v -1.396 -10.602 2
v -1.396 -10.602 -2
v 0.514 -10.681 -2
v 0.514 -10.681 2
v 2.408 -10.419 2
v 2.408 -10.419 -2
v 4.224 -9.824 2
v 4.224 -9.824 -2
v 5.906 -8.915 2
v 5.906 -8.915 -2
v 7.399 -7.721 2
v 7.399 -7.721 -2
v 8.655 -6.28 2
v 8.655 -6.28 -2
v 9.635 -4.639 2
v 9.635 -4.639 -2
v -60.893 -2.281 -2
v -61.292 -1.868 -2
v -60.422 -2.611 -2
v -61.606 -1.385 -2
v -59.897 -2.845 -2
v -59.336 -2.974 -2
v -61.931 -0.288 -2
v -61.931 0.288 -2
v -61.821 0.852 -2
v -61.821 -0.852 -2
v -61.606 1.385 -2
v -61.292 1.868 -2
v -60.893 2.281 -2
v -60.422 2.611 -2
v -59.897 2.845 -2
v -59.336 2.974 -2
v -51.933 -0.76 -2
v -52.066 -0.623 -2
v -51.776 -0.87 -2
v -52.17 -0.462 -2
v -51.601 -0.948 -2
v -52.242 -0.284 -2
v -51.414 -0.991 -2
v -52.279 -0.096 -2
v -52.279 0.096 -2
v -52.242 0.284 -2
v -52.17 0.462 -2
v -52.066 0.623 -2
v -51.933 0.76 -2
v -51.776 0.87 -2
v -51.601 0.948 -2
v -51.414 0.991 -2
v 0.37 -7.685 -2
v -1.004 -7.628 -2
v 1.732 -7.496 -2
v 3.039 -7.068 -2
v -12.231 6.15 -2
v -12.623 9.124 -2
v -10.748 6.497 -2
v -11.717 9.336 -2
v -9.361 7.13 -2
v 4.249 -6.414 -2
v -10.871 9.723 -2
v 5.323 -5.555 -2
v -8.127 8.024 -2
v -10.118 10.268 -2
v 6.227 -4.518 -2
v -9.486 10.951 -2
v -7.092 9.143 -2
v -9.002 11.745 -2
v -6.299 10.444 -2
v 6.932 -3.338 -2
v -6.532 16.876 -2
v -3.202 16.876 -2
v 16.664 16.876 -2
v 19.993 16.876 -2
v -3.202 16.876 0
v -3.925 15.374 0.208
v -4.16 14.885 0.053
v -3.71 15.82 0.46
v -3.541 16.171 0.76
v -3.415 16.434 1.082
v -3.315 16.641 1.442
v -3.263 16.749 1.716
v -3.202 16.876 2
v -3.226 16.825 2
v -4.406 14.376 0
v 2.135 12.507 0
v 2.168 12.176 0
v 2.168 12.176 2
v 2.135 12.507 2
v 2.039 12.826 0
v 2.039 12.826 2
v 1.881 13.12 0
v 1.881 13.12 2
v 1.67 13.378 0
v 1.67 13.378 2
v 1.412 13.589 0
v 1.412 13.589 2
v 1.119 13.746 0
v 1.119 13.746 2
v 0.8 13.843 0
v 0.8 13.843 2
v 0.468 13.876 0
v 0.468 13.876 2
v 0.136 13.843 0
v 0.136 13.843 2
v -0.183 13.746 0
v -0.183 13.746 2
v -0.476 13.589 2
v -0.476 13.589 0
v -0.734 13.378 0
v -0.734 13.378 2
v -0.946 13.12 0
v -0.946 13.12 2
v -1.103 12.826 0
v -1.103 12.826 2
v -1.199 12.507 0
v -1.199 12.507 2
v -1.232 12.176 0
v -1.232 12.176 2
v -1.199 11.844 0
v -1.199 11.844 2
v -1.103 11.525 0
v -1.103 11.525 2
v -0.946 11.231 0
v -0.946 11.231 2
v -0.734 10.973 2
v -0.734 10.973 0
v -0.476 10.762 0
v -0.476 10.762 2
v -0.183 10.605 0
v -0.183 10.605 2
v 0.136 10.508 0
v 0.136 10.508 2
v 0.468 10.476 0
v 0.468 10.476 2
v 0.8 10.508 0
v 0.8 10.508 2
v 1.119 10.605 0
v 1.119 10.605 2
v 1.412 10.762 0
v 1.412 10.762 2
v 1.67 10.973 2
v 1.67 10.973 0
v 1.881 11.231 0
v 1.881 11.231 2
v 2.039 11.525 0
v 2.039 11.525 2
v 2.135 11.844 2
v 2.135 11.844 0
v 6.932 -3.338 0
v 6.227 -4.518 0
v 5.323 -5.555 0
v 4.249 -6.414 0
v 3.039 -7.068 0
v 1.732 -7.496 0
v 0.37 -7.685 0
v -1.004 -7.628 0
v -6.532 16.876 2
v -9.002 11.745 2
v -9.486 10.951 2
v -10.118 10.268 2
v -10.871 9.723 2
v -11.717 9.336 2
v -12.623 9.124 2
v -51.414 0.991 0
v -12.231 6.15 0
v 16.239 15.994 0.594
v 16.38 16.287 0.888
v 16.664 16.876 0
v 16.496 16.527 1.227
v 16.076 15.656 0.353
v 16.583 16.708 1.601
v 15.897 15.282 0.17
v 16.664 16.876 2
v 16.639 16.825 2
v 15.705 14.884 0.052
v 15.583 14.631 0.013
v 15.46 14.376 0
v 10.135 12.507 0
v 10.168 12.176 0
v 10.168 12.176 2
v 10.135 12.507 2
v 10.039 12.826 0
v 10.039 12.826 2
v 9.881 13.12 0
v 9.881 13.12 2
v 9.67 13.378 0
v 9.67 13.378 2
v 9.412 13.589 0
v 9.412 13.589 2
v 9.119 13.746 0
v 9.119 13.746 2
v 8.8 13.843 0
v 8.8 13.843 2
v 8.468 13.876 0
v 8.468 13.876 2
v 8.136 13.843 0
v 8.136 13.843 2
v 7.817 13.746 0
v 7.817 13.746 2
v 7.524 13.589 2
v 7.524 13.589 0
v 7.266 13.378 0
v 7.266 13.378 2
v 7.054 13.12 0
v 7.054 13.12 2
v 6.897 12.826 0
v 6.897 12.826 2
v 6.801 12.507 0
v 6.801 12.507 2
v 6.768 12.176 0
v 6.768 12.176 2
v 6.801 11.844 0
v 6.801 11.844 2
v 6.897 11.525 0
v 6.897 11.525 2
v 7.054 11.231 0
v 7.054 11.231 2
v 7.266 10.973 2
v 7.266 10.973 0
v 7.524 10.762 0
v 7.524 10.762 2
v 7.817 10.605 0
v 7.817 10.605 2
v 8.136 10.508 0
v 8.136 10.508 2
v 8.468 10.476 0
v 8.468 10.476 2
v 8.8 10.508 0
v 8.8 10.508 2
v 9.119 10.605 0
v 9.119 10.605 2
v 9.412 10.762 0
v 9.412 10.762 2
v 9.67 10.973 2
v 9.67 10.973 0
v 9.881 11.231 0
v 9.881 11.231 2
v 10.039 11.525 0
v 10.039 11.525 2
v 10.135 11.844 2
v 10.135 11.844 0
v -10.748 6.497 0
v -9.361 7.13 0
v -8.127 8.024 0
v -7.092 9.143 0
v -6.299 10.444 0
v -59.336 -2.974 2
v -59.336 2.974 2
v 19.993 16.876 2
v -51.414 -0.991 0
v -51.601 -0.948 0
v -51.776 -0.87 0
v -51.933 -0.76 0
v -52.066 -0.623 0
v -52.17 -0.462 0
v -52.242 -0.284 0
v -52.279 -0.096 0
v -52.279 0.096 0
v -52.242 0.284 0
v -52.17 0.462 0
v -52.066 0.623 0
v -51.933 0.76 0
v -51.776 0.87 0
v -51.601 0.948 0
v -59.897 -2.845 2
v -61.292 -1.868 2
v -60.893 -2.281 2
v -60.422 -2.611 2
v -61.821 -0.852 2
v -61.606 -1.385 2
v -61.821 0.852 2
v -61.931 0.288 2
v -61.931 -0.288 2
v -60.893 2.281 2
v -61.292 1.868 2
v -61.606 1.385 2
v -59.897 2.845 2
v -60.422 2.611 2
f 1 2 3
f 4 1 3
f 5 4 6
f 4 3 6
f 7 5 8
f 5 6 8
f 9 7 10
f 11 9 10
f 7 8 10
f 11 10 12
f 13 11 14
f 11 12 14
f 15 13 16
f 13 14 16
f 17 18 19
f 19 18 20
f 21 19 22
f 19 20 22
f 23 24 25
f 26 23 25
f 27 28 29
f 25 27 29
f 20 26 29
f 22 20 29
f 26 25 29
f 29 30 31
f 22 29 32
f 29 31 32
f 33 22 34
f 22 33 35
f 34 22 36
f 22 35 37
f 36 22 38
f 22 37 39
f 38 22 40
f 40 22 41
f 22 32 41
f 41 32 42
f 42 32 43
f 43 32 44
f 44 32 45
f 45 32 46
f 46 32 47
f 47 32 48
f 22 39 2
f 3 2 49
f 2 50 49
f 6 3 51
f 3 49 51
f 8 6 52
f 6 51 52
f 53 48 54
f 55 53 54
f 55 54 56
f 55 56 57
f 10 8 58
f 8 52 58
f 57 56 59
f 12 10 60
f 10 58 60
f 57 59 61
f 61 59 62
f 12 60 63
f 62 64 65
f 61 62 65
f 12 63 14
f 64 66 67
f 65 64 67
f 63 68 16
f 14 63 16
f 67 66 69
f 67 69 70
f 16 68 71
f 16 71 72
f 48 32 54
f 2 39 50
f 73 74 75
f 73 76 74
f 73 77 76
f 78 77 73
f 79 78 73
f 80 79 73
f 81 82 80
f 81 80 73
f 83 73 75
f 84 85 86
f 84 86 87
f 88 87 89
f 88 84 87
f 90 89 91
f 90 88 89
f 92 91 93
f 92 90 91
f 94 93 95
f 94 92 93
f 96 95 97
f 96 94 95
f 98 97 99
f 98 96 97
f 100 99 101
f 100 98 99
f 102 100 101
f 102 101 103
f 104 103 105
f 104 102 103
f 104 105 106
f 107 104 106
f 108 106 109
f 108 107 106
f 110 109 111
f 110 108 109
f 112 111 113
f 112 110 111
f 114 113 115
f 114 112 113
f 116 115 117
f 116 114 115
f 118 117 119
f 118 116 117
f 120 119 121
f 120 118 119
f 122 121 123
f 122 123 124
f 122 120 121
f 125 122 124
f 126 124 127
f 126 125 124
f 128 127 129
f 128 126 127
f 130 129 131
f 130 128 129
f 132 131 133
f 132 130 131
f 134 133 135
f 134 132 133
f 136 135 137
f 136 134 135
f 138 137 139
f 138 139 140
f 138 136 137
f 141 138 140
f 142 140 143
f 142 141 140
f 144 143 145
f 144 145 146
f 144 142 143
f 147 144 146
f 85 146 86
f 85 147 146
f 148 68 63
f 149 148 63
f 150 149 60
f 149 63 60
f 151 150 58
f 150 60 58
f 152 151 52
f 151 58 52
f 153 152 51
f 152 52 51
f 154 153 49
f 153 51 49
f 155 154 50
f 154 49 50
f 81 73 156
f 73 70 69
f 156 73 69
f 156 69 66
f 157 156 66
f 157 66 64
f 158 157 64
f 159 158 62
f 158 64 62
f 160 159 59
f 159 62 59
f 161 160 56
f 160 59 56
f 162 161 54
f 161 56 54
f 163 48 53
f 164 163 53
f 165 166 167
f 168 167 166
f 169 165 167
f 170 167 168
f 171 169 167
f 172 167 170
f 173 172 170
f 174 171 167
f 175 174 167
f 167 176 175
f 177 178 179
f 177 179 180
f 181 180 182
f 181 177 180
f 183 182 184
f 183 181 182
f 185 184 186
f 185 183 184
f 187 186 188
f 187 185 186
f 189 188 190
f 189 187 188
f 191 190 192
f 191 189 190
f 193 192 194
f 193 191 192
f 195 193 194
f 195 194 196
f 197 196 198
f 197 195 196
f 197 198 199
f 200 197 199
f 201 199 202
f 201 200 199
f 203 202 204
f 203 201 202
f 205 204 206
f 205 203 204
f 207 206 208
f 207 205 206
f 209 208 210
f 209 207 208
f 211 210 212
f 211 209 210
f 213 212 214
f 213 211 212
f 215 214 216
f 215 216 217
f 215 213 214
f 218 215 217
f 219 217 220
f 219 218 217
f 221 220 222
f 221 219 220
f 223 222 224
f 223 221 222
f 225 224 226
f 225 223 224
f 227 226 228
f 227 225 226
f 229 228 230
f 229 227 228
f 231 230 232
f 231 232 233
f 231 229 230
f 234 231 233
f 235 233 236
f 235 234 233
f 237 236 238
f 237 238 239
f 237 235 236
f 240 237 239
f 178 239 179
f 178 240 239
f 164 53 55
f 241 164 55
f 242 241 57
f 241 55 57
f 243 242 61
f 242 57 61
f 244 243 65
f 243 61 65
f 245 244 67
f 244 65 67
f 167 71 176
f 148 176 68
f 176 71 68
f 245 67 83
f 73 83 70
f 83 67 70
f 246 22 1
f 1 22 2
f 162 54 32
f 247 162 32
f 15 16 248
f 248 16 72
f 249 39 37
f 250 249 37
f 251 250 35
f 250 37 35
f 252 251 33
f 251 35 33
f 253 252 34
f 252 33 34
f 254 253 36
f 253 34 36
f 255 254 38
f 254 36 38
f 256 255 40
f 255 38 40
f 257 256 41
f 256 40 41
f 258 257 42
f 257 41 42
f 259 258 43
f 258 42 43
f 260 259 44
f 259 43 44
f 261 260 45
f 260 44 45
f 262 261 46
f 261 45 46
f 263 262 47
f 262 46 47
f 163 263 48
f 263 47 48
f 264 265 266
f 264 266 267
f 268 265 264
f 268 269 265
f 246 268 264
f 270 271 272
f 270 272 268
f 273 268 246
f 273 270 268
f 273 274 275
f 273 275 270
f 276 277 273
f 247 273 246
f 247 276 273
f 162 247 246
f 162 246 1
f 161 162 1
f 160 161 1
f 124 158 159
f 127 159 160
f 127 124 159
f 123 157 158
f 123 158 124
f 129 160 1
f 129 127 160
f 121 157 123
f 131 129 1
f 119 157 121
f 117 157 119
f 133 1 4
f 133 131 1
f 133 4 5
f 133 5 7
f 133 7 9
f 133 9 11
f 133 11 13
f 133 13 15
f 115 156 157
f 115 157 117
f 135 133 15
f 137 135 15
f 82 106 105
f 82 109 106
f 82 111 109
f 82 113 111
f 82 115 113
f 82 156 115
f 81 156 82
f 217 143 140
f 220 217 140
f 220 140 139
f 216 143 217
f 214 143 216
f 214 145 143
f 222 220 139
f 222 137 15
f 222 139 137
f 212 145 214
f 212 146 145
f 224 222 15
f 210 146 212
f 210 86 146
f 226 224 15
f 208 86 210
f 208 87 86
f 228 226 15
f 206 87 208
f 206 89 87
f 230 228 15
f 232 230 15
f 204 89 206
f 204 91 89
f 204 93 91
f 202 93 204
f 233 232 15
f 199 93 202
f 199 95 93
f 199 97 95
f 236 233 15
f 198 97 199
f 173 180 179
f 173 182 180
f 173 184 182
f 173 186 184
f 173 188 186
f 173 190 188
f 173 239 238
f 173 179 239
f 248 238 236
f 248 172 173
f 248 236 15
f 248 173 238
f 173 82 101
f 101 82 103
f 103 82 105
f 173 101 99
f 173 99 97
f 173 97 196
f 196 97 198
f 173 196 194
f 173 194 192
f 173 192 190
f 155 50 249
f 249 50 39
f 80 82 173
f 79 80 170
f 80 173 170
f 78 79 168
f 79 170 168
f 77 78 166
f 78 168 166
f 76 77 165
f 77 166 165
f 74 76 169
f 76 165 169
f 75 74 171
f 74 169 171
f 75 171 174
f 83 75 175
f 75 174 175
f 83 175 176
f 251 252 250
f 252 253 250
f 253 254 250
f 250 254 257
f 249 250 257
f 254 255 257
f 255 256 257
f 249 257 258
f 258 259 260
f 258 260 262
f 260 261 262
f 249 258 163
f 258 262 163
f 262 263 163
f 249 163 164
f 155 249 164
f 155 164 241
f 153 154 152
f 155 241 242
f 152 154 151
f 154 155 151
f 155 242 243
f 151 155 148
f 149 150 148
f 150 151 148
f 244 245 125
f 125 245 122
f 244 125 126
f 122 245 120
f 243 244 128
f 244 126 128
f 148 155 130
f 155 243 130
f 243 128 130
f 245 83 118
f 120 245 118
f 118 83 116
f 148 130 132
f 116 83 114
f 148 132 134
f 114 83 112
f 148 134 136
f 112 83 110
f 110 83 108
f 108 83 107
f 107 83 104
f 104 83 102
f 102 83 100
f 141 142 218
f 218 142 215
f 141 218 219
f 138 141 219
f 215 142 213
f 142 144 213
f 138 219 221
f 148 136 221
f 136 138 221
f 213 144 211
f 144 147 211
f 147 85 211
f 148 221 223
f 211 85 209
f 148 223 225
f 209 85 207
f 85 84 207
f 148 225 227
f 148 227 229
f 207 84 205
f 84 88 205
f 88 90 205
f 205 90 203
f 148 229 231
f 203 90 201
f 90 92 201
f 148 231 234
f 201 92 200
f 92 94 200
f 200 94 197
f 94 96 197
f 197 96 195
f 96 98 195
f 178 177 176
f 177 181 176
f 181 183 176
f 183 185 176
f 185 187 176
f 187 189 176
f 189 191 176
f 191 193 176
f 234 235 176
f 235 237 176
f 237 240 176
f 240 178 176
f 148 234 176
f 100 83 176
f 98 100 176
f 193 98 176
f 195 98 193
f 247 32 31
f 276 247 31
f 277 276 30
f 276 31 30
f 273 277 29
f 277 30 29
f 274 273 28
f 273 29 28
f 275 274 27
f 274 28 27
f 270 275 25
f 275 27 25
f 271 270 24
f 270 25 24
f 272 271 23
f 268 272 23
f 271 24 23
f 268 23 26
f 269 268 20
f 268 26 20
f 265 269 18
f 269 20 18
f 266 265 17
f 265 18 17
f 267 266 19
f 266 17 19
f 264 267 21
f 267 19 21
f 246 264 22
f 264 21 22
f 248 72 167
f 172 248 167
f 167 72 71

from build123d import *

# Parameters (mm, degrees)
ESQUISSE1_R        = 1.7
BOSS_EXTRU_1_DEPTH = 2
BOSS_EXTRU_2_START = -2
BOSS_EXTRU_2_DEPTH = 2
CONG_1_R           = 2.5


with BuildPart() as part:
    # Esquisse1 → Boss.-Extru.1 (new body)
    # profile 1 of 2: a face of its own
    with BuildSketch(Plane.XY):
        with BuildLine():
            Line((-6.298682213, 10.443854679), (-3.202171033, 16.875533229))
            Line((-3.202171033, 16.875533229), (-6.531753493, 16.875533229))
            Line((-6.531753493, 16.875533229), (-9.001723843, 11.745225474))
            ThreePointArc((-9.001723843, 11.745225474), (-10.480816133, 9.976643404), (-12.62301596, 9.124248871))
            Line((-12.62301596, 9.124248871), (-59.336252698, 2.974334584))
            ThreePointArc((-59.336252698, 2.974334584), (-61.944674121, 0), (-59.336252698, -2.974334584))
            Line((-59.336252698, -2.974334584), (-1.395824109, -10.602336719))
            ThreePointArc((-1.395824109, -10.602336719), (5.08555675, -9.407177121), (9.635283697, -4.638876688))
            Line((9.635283697, -4.638876688), (19.993327919, 16.875533229))
            Line((19.993327919, 16.875533229), (16.663745459, 16.875533229))
            Line((16.663745459, 16.875533229), (6.932242067, -3.337505893))
            ThreePointArc((6.932242067, -3.337505893), (3.658876225, -6.768127543), (-1.004245533, -7.628002135))
            Line((-1.004245533, -7.628002135), (-51.413902738, -0.991444861))
            ThreePointArc((-51.413902738, -0.991444861), (-52.283376546, 0), (-51.413902738, 0.991444861))
            Line((-51.413902738, 0.991444861), (-12.231437384, 6.149914287))
            ThreePointArc((-12.231437384, 6.149914287), (-8.721875965, 7.546390437), (-6.298682213, 10.443854679))
        make_face()
    # profile 2 of 2: a face of its own
    with BuildSketch(Plane.XY):
        with BuildLine():
            Line((16.663745459, 16.875533229), (-3.202171033, 16.875533229))
            Line((-3.202171033, 16.875533229), (-6.298682213, 10.443854679))
            ThreePointArc((-6.298682213, 10.443854679), (-8.721875965, 7.546390437), (-12.231437384, 6.149914287))
            Line((-12.231437384, 6.149914287), (-51.413902738, 0.991444861))
            ThreePointArc((-51.413902738, 0.991444861), (-52.283376546, 0), (-51.413902738, -0.991444861))
            Line((-51.413902738, -0.991444861), (-1.004245533, -7.628002135))
            ThreePointArc((-1.004245533, -7.628002135), (3.658876225, -6.768127543), (6.932242067, -3.337505893))
            Line((6.932242067, -3.337505893), (16.663745459, 16.875533229))
        make_face()
        with Locations((0.467987162, 12.175533229)):
            Circle(ESQUISSE1_R, mode=Mode.SUBTRACT)
        with Locations((8.467987162, 12.175533229)):
            Circle(ESQUISSE1_R, mode=Mode.SUBTRACT)
    extrude(amount=BOSS_EXTRU_1_DEPTH)

    # Esquisse1<5> → Boss.-Extru.2 (add)
    with BuildSketch(Plane.XY.offset(BOSS_EXTRU_2_START)):
        with BuildLine():
            Line((-6.298682213, 10.443854679), (-3.202171033, 16.875533229))
            Line((-3.202171033, 16.875533229), (-6.531753493, 16.875533229))
            Line((-6.531753493, 16.875533229), (-9.001723843, 11.745225474))
            ThreePointArc((-9.001723843, 11.745225474), (-10.480816133, 9.976643404), (-12.62301596, 9.124248871))
            Line((-12.62301596, 9.124248871), (-59.336252698, 2.974334584))
            ThreePointArc((-59.336252698, 2.974334584), (-61.944674121, 0), (-59.336252698, -2.974334584))
            Line((-59.336252698, -2.974334584), (-1.395824109, -10.602336719))
            ThreePointArc((-1.395824109, -10.602336719), (5.08555675, -9.407177121), (9.635283697, -4.638876688))
            Line((9.635283697, -4.638876688), (19.993327919, 16.875533229))
            Line((19.993327919, 16.875533229), (16.663745459, 16.875533229))
            Line((16.663745459, 16.875533229), (6.932242067, -3.337505893))
            ThreePointArc((6.932242067, -3.337505893), (3.658876225, -6.768127543), (-1.004245533, -7.628002135))
            Line((-1.004245533, -7.628002135), (-51.413902738, -0.991444861))
            ThreePointArc((-51.413902738, -0.991444861), (-52.283376546, 0), (-51.413902738, 0.991444861))
            Line((-51.413902738, 0.991444861), (-12.231437384, 6.149914287))
            ThreePointArc((-12.231437384, 6.149914287), (-8.721875965, 7.546390437), (-6.298682213, 10.443854679))
        make_face()
    extrude(amount=BOSS_EXTRU_2_DEPTH)

    # Congé1
    # the kernel refuses this fillet: 2.5 mm, written as the material it takes off along each edge
    with BuildSketch(Plane(origin=(22.913745459, 16.875533229, 0), x_dir=(0, 0, 1), z_dir=(-1, 0, 0))) as cong_1_piece_1_section:
        with BuildLine():
            CenterArc((CONG_1_R, -CONG_1_R), CONG_1_R, 90, 90)
            Line((0, -CONG_1_R), (0, 0))
            Line((0, 0), (CONG_1_R, 0))
        make_face()
    cong_1_piece_1 = extrude(amount=32.365916492, mode=Mode.PRIVATE)
    cong_1_piece_1 = split(cong_1_piece_1, bisect_by=Plane(origin=(14.522128014, 12.4272383, 0.565987786), z_dir=(-0.9010138766913354, 0.4337902650010155, 0)), keep=Keep.TOP, mode=Mode.PRIVATE)
    cong_1_piece_1 = split(cong_1_piece_1, bisect_by=Plane(origin=(-1.605539627, 20.191852587, 0.565987786), z_dir=(0.9010138766913354, -0.4337902650010154, 0)), keep=Keep.TOP, mode=Mode.PRIVATE)
    add(cong_1_piece_1, mode=Mode.SUBTRACT)


solid = part.part
